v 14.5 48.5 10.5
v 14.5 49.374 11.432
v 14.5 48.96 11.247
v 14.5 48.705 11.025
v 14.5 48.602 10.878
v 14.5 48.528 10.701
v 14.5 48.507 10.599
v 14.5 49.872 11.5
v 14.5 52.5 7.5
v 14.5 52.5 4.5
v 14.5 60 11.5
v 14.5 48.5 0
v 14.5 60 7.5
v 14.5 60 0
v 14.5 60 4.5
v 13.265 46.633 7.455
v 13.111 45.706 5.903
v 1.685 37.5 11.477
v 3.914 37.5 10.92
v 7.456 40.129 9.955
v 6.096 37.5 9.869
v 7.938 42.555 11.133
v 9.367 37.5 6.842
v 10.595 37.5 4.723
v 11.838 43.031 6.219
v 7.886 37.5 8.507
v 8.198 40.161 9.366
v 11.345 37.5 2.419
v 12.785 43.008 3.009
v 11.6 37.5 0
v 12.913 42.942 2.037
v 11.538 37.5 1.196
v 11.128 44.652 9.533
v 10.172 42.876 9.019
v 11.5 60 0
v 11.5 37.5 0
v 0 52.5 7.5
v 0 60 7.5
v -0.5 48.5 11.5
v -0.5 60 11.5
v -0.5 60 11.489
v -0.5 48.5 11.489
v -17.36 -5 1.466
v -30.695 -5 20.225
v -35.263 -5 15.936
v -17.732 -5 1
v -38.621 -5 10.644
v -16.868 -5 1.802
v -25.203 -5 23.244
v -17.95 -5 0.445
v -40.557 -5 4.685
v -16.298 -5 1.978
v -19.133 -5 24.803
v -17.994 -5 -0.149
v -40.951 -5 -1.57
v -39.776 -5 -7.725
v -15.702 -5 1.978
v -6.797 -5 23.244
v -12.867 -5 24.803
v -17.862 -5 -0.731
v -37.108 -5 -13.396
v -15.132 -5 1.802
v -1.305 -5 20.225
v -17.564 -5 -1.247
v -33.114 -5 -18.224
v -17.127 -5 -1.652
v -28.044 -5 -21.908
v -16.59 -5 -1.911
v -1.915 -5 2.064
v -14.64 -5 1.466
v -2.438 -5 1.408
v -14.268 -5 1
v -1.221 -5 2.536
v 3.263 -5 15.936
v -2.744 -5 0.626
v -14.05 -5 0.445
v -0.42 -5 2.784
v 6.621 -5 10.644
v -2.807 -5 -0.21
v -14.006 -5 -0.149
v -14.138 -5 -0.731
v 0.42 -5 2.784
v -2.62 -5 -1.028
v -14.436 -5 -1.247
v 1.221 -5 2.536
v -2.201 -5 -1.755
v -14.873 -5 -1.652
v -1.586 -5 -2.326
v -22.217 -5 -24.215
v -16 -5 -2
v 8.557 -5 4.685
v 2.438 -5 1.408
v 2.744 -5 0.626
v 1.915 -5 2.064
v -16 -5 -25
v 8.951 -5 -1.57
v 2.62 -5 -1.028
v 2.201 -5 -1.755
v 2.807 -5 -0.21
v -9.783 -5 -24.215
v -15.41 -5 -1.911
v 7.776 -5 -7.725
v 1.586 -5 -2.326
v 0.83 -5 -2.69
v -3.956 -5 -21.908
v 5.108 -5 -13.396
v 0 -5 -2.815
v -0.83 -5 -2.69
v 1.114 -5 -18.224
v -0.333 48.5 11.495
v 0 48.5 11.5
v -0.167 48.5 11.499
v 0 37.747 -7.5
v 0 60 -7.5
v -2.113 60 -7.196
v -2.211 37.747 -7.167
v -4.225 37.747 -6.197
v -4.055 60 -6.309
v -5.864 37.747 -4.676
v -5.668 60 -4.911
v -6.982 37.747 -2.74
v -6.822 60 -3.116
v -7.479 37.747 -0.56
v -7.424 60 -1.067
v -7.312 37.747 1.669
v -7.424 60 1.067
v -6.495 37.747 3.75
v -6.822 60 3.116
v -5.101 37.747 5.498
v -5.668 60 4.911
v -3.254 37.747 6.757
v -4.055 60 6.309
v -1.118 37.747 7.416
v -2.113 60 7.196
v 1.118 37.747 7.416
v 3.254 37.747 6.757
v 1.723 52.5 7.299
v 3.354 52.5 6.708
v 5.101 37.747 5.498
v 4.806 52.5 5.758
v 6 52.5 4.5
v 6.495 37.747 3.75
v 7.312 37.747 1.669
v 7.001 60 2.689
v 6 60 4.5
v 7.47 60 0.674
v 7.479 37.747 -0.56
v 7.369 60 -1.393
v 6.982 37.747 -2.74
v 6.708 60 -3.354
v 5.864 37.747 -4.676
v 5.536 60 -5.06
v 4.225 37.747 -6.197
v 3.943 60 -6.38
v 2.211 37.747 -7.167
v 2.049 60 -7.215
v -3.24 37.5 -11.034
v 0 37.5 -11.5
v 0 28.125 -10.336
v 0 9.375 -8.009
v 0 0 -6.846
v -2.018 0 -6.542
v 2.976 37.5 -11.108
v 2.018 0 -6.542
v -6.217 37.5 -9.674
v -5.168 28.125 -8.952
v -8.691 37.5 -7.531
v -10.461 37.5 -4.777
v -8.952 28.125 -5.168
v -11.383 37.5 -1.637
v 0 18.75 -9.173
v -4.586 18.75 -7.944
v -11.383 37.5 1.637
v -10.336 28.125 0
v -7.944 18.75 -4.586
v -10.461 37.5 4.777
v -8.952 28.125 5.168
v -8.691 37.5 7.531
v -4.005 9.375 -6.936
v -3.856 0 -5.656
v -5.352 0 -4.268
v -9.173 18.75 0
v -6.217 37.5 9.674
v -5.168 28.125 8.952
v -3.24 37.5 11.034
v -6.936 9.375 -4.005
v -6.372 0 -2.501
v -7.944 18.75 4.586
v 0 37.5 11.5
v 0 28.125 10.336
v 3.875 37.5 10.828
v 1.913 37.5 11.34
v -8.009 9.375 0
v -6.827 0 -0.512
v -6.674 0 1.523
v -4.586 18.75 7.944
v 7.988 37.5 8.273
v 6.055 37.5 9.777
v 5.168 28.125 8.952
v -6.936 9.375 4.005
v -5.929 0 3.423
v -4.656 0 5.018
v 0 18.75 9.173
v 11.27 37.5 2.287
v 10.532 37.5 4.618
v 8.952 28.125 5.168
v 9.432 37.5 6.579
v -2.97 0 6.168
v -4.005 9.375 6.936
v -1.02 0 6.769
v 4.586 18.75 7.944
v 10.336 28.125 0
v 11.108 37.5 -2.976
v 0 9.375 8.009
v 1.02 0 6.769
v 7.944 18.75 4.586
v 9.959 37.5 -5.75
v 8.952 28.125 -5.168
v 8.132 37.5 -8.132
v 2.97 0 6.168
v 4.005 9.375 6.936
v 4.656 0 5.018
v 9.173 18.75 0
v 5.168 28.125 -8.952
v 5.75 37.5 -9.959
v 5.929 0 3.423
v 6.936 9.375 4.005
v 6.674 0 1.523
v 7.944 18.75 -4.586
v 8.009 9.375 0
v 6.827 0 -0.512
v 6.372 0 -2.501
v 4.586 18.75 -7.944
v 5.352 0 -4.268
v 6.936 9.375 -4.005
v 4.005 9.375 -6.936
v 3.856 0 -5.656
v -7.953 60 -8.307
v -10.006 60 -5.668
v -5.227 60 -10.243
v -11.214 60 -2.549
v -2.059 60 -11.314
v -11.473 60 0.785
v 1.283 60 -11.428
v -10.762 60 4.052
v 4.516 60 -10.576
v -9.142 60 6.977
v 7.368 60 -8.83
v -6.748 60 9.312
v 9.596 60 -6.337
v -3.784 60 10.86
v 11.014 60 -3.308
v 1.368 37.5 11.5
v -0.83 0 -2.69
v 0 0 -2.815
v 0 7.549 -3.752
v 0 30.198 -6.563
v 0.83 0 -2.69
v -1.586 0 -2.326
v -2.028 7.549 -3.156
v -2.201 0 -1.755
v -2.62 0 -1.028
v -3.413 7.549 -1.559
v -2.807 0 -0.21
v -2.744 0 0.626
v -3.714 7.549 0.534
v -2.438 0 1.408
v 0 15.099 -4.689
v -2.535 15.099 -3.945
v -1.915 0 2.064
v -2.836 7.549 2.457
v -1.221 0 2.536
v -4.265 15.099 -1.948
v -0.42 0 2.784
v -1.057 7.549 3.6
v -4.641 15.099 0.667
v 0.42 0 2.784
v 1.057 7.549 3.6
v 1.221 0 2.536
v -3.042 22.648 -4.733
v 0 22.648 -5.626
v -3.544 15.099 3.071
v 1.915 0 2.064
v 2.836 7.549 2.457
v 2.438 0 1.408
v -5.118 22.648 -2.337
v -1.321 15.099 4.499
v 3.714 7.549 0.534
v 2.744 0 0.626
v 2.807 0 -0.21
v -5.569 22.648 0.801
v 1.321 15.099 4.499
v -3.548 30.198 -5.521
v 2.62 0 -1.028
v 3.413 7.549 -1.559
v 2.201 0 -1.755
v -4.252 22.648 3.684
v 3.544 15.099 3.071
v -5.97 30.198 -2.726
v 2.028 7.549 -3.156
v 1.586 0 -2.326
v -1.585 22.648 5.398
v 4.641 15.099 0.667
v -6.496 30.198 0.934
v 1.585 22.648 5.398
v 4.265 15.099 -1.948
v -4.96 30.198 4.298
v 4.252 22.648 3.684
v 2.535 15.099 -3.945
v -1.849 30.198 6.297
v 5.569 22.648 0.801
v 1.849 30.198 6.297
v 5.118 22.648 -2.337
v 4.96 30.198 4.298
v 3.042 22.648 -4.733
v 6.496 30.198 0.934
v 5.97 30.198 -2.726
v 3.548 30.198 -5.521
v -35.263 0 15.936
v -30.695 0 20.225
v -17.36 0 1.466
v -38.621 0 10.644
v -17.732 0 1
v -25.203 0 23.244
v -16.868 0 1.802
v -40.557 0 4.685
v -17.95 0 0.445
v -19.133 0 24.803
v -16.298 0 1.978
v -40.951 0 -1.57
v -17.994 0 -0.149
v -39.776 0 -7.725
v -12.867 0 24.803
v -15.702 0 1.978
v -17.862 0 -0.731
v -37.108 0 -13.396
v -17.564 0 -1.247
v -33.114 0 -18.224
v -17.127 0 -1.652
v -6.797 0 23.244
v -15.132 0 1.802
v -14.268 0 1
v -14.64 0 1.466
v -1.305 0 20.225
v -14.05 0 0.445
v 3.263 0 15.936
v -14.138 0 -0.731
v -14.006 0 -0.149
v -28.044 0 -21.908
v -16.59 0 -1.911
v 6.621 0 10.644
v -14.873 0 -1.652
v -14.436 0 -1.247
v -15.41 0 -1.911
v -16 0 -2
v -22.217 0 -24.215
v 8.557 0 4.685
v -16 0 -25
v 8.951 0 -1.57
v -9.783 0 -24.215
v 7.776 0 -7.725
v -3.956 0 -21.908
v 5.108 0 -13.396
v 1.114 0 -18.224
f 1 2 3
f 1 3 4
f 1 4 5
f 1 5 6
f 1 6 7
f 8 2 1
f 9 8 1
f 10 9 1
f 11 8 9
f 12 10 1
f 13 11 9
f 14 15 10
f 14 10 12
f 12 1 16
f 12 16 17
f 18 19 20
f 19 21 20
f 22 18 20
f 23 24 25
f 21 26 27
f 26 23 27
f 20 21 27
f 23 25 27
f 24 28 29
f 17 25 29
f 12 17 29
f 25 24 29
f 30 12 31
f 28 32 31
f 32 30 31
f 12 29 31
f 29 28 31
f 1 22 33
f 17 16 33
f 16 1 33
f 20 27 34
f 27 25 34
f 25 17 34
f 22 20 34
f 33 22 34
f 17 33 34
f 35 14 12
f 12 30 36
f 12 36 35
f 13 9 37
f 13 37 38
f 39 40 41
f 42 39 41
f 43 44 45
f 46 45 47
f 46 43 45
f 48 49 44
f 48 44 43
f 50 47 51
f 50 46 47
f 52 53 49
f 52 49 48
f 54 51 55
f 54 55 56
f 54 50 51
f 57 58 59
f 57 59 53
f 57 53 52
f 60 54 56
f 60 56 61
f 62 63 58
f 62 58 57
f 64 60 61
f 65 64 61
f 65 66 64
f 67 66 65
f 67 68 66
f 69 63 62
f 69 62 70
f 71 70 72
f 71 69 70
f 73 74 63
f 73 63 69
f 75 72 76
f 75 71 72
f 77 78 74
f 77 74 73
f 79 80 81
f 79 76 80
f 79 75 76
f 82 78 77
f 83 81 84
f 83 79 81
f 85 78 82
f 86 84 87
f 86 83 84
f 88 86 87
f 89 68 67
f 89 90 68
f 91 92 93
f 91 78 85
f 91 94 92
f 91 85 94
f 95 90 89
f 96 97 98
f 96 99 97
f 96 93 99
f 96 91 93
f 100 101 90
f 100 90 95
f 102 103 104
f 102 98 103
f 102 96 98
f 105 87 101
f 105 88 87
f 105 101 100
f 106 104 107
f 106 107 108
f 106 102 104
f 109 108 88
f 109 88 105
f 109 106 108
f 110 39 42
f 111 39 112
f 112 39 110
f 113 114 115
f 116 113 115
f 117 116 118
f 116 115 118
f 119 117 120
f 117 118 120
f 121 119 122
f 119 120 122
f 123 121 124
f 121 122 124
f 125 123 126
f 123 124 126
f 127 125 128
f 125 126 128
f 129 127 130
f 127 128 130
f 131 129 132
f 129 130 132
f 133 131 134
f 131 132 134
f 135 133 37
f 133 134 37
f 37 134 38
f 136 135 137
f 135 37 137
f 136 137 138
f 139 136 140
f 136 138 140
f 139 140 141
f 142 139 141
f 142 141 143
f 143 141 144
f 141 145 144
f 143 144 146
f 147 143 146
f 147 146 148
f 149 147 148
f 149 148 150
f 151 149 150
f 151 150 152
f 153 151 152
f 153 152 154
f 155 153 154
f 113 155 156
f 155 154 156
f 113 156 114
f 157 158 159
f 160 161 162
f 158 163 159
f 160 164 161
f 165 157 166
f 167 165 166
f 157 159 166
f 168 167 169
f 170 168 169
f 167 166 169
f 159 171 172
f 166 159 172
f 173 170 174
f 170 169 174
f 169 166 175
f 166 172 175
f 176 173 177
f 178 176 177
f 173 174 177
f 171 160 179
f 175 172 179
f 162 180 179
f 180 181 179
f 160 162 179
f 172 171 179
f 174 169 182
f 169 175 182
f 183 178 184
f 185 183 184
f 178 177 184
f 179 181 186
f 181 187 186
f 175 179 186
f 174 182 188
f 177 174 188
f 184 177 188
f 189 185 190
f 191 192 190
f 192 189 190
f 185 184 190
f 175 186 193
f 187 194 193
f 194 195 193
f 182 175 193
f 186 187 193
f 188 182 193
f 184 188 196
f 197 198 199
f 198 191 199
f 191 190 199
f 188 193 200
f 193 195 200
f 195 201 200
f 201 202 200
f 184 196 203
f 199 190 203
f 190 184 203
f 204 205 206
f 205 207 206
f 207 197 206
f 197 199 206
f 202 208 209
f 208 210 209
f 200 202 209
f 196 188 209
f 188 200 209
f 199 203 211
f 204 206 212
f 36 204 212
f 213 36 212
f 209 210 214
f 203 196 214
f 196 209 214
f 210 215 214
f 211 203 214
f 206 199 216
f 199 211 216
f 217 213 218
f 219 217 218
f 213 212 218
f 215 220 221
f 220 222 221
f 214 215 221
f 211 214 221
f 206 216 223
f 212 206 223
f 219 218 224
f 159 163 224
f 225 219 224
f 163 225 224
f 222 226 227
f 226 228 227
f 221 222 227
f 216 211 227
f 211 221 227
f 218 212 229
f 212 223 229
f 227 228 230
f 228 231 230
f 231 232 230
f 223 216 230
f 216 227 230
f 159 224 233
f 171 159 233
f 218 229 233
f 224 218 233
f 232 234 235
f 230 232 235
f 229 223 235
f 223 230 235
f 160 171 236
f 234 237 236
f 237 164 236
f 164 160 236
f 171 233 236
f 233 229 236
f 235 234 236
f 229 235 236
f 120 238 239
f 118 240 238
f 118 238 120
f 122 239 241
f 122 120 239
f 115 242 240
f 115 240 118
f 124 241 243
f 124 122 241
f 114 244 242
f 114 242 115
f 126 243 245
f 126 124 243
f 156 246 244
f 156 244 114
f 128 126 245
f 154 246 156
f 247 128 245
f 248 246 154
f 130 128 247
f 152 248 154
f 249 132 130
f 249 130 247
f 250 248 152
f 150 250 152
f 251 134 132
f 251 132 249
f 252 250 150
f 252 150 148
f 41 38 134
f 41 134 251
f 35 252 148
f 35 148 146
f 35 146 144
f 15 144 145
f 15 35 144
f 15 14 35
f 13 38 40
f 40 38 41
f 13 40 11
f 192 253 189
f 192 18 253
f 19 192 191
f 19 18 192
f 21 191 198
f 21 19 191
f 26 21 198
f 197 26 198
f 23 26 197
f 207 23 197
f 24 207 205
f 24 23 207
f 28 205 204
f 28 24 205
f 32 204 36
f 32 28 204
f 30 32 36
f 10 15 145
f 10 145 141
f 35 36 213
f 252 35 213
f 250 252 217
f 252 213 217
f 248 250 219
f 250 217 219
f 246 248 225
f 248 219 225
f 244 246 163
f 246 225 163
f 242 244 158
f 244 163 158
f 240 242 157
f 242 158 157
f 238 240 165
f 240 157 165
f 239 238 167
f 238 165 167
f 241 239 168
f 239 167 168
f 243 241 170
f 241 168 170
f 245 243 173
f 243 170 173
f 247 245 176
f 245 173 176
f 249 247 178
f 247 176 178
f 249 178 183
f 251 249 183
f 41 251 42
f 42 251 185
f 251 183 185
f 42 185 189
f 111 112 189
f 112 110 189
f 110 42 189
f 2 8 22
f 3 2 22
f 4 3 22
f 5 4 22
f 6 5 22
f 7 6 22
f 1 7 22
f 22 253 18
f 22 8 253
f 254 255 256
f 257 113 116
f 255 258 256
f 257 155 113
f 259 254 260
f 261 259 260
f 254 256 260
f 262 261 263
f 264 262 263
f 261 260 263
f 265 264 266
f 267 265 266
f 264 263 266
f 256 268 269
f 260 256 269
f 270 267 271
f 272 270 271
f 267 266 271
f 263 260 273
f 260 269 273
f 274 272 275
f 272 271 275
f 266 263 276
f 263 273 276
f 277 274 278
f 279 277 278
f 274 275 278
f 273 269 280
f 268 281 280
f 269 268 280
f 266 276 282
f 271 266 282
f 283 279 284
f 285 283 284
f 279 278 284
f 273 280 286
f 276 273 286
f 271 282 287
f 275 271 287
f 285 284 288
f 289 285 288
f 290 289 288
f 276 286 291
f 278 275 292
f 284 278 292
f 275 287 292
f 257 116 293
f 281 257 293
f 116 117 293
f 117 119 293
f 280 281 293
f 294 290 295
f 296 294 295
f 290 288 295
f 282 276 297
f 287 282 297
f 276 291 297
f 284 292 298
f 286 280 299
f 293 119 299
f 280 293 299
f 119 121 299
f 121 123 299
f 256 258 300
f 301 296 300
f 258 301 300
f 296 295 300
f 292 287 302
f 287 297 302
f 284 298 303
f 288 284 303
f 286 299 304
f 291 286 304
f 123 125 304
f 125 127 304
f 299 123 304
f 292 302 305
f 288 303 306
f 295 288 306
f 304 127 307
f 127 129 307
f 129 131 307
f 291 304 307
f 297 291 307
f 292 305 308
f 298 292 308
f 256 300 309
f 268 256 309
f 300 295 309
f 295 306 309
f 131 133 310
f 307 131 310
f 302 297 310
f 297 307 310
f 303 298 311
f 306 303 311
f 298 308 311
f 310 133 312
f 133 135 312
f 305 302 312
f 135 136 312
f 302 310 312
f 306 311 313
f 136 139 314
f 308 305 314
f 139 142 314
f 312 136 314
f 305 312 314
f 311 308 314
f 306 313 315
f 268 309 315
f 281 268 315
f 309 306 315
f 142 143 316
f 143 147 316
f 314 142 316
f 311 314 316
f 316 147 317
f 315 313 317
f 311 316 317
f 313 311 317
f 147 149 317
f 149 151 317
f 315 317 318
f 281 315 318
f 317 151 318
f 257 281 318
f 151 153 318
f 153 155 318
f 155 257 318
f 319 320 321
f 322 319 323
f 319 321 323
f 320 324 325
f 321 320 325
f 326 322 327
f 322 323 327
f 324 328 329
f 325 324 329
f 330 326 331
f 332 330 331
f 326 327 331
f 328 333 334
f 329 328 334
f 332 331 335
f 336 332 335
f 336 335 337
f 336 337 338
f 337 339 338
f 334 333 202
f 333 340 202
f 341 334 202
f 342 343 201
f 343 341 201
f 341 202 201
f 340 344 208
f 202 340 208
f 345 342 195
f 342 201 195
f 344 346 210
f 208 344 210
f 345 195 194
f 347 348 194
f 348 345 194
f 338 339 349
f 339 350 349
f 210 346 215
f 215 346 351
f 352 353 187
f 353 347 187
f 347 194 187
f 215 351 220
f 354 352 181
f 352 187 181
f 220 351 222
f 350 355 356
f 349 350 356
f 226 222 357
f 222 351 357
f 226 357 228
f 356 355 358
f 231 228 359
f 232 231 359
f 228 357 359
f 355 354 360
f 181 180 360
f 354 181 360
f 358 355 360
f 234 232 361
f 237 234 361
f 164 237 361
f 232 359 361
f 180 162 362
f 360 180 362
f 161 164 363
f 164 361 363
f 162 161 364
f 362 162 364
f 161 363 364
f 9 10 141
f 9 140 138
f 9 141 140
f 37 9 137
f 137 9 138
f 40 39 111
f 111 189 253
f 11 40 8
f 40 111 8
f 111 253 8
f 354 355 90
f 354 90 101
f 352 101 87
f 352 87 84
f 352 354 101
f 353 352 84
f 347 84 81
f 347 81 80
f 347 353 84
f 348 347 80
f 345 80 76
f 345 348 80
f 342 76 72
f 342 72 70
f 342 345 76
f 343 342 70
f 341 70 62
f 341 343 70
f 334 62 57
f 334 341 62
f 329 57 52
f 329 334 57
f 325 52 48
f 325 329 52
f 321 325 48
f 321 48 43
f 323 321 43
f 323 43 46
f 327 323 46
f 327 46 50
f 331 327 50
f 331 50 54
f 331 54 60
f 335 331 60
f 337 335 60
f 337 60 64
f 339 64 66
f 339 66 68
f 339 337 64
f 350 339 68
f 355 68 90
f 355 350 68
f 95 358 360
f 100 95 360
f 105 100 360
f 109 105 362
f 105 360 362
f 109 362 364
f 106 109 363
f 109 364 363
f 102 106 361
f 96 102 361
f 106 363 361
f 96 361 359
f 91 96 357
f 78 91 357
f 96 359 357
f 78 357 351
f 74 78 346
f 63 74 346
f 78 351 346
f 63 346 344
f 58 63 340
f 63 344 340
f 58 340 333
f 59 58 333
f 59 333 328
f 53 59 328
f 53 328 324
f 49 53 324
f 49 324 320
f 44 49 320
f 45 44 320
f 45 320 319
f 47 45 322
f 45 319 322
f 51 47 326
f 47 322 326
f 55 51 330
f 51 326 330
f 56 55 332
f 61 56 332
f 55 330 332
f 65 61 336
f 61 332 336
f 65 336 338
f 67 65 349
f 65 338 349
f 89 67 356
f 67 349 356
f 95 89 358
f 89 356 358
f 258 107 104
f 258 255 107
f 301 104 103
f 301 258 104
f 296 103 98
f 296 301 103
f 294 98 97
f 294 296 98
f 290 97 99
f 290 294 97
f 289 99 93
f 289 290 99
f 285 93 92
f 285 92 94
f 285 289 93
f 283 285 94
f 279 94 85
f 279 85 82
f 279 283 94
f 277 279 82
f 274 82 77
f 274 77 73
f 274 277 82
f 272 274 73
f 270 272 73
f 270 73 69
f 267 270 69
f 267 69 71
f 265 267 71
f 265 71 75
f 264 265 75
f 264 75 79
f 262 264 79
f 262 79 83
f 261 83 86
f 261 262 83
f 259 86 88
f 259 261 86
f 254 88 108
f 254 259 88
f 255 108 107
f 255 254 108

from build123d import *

# Parameters (mm, degrees)
BOSS_EXTRUDE2_DEPTH = 15
SKETCH9_W           = 3
SKETCH9_H           = 7.5
CUT_EXTRUDE2_DEPTH  = 14.5
SKETCH10_R          = 7.5
CUT_EXTRUDE3_DEPTH  = 19
FILLET2_R           = 1
BOSS_EXTRUDE3_START = -5
SKETCH13_R          = 25
SKETCH13_R_2        = 2.815
SKETCH13_R_3        = 2
BOSS_EXTRUDE3_DEPTH = 5


with BuildPart() as part:
    # Sketch1 → Revolve1 (revolve)
    with BuildSketch(Plane.XY, mode=Mode.PRIVATE) as revolve1_sk:
        Polygon((2.815, 0), (7.5, 37.747281127), (7.5, 60), (11.5, 60), (11.5, 37.5), (6.845691272, 0), (8, 0), (8, -5), (2.815, -4.99976246), align=None)
    revolve(revolve1_sk.sketch.rotate(Axis((0, 0, 0), (0, 1, 0)), 90), axis=Axis((0, 0, 0), (0, 1, 0)))

    # Sketch8 → Boss-Extrude2 (add)
    with BuildSketch(Plane(origin=(14.5, 0, 0), x_dir=(0, 0, -1), z_dir=(1, 0, 0))):
        Polygon((-7.5, 60), (-11.5, 60), (-11.5, 48.5), (0, 48.5), (0, 60), (-4.5, 60), (-4.5, 52.5), (-7.5, 52.5), align=None)
    extrude(amount=-BOSS_EXTRUDE2_DEPTH)

    # Sketch9 → Cut-Extrude2 (cut)
    with BuildSketch(Plane(origin=(14.5, 0, 0), x_dir=(0, 0, -1), z_dir=(1, 0, 0))):
        with Locations((-6, 56.25)):
            Rectangle(SKETCH9_W, SKETCH9_H)
    extrude(amount=-CUT_EXTRUDE2_DEPTH, mode=Mode.SUBTRACT)

    # Sketch10 → Cut-Extrude3 (cut)
    with BuildSketch(Plane(origin=(0, 60, 0), x_dir=(1, 0, 0), z_dir=(0, 1, 0))):
        with Locations(Location((0, 0, 0), (0, 0, 90))):
            Circle(SKETCH10_R)
    extrude(amount=-CUT_EXTRUDE3_DEPTH, mode=Mode.SUBTRACT)

    # Sketch11 for Loft4 → Loft4 section 0
    with BuildSketch(Plane.XZ.offset(-48.5)):
        with BuildLine():
            Line((0, 11.5), (14.5, 11.5))
            Line((14.5, 11.5), (14.5, 0))
            Line((14.5, 0), (11.5, 0))
            # circular arc as an exact rational Bezier (weights 1, cos(half-angle), 1)
            Bezier((11.5, 0), (11.5, 11.5), (0, 11.5), weights=[1, 0.707106781, 1])
        make_face()
    # Sketch12 for Loft4 → Loft4 section 1
    with BuildSketch(Plane(origin=(0, 37.5, 0), x_dir=(1, 0, 0), z_dir=(0, 1, 0))):
        with BuildLine():
            Line((0, -11.5), (1.519868415, -11.5))
            Bezier((1.519868415, -11.5), (11.6, -10.167784903), (11.6, 0), weights=[1, 0.752005033, 1])
            Line((11.6, 0), (11.5, 0))
            Bezier((11.5, 0), (11.5, -11.5), (0, -11.5), weights=[1, 0.707106781, 1])
        make_face()
    loft()

    # Fillet2
    fillet2_edges = [part.edges().sort_by_distance(p)[0] for p in [
        (8.009934208, 43, 11.5),
    ]]
    fillet(fillet2_edges, radius=FILLET2_R)

    # Sketch13 → Boss-Extrude3 (add)
    with BuildSketch(Plane.XZ.offset(5).offset(BOSS_EXTRUDE3_START)):
        with Locations(Location((-16, 0, 0), (0, 0, 270))):
            Circle(SKETCH13_R)
        with Locations(Location((0, 0, 0), (0, 0, 270))):
            Circle(SKETCH13_R_2, mode=Mode.SUBTRACT)
        with Locations(Location((-16, 0, 0), (0, 0, 270))):
            Circle(SKETCH13_R_3, mode=Mode.SUBTRACT)
    extrude(amount=BOSS_EXTRUDE3_DEPTH)


solid = part.part
